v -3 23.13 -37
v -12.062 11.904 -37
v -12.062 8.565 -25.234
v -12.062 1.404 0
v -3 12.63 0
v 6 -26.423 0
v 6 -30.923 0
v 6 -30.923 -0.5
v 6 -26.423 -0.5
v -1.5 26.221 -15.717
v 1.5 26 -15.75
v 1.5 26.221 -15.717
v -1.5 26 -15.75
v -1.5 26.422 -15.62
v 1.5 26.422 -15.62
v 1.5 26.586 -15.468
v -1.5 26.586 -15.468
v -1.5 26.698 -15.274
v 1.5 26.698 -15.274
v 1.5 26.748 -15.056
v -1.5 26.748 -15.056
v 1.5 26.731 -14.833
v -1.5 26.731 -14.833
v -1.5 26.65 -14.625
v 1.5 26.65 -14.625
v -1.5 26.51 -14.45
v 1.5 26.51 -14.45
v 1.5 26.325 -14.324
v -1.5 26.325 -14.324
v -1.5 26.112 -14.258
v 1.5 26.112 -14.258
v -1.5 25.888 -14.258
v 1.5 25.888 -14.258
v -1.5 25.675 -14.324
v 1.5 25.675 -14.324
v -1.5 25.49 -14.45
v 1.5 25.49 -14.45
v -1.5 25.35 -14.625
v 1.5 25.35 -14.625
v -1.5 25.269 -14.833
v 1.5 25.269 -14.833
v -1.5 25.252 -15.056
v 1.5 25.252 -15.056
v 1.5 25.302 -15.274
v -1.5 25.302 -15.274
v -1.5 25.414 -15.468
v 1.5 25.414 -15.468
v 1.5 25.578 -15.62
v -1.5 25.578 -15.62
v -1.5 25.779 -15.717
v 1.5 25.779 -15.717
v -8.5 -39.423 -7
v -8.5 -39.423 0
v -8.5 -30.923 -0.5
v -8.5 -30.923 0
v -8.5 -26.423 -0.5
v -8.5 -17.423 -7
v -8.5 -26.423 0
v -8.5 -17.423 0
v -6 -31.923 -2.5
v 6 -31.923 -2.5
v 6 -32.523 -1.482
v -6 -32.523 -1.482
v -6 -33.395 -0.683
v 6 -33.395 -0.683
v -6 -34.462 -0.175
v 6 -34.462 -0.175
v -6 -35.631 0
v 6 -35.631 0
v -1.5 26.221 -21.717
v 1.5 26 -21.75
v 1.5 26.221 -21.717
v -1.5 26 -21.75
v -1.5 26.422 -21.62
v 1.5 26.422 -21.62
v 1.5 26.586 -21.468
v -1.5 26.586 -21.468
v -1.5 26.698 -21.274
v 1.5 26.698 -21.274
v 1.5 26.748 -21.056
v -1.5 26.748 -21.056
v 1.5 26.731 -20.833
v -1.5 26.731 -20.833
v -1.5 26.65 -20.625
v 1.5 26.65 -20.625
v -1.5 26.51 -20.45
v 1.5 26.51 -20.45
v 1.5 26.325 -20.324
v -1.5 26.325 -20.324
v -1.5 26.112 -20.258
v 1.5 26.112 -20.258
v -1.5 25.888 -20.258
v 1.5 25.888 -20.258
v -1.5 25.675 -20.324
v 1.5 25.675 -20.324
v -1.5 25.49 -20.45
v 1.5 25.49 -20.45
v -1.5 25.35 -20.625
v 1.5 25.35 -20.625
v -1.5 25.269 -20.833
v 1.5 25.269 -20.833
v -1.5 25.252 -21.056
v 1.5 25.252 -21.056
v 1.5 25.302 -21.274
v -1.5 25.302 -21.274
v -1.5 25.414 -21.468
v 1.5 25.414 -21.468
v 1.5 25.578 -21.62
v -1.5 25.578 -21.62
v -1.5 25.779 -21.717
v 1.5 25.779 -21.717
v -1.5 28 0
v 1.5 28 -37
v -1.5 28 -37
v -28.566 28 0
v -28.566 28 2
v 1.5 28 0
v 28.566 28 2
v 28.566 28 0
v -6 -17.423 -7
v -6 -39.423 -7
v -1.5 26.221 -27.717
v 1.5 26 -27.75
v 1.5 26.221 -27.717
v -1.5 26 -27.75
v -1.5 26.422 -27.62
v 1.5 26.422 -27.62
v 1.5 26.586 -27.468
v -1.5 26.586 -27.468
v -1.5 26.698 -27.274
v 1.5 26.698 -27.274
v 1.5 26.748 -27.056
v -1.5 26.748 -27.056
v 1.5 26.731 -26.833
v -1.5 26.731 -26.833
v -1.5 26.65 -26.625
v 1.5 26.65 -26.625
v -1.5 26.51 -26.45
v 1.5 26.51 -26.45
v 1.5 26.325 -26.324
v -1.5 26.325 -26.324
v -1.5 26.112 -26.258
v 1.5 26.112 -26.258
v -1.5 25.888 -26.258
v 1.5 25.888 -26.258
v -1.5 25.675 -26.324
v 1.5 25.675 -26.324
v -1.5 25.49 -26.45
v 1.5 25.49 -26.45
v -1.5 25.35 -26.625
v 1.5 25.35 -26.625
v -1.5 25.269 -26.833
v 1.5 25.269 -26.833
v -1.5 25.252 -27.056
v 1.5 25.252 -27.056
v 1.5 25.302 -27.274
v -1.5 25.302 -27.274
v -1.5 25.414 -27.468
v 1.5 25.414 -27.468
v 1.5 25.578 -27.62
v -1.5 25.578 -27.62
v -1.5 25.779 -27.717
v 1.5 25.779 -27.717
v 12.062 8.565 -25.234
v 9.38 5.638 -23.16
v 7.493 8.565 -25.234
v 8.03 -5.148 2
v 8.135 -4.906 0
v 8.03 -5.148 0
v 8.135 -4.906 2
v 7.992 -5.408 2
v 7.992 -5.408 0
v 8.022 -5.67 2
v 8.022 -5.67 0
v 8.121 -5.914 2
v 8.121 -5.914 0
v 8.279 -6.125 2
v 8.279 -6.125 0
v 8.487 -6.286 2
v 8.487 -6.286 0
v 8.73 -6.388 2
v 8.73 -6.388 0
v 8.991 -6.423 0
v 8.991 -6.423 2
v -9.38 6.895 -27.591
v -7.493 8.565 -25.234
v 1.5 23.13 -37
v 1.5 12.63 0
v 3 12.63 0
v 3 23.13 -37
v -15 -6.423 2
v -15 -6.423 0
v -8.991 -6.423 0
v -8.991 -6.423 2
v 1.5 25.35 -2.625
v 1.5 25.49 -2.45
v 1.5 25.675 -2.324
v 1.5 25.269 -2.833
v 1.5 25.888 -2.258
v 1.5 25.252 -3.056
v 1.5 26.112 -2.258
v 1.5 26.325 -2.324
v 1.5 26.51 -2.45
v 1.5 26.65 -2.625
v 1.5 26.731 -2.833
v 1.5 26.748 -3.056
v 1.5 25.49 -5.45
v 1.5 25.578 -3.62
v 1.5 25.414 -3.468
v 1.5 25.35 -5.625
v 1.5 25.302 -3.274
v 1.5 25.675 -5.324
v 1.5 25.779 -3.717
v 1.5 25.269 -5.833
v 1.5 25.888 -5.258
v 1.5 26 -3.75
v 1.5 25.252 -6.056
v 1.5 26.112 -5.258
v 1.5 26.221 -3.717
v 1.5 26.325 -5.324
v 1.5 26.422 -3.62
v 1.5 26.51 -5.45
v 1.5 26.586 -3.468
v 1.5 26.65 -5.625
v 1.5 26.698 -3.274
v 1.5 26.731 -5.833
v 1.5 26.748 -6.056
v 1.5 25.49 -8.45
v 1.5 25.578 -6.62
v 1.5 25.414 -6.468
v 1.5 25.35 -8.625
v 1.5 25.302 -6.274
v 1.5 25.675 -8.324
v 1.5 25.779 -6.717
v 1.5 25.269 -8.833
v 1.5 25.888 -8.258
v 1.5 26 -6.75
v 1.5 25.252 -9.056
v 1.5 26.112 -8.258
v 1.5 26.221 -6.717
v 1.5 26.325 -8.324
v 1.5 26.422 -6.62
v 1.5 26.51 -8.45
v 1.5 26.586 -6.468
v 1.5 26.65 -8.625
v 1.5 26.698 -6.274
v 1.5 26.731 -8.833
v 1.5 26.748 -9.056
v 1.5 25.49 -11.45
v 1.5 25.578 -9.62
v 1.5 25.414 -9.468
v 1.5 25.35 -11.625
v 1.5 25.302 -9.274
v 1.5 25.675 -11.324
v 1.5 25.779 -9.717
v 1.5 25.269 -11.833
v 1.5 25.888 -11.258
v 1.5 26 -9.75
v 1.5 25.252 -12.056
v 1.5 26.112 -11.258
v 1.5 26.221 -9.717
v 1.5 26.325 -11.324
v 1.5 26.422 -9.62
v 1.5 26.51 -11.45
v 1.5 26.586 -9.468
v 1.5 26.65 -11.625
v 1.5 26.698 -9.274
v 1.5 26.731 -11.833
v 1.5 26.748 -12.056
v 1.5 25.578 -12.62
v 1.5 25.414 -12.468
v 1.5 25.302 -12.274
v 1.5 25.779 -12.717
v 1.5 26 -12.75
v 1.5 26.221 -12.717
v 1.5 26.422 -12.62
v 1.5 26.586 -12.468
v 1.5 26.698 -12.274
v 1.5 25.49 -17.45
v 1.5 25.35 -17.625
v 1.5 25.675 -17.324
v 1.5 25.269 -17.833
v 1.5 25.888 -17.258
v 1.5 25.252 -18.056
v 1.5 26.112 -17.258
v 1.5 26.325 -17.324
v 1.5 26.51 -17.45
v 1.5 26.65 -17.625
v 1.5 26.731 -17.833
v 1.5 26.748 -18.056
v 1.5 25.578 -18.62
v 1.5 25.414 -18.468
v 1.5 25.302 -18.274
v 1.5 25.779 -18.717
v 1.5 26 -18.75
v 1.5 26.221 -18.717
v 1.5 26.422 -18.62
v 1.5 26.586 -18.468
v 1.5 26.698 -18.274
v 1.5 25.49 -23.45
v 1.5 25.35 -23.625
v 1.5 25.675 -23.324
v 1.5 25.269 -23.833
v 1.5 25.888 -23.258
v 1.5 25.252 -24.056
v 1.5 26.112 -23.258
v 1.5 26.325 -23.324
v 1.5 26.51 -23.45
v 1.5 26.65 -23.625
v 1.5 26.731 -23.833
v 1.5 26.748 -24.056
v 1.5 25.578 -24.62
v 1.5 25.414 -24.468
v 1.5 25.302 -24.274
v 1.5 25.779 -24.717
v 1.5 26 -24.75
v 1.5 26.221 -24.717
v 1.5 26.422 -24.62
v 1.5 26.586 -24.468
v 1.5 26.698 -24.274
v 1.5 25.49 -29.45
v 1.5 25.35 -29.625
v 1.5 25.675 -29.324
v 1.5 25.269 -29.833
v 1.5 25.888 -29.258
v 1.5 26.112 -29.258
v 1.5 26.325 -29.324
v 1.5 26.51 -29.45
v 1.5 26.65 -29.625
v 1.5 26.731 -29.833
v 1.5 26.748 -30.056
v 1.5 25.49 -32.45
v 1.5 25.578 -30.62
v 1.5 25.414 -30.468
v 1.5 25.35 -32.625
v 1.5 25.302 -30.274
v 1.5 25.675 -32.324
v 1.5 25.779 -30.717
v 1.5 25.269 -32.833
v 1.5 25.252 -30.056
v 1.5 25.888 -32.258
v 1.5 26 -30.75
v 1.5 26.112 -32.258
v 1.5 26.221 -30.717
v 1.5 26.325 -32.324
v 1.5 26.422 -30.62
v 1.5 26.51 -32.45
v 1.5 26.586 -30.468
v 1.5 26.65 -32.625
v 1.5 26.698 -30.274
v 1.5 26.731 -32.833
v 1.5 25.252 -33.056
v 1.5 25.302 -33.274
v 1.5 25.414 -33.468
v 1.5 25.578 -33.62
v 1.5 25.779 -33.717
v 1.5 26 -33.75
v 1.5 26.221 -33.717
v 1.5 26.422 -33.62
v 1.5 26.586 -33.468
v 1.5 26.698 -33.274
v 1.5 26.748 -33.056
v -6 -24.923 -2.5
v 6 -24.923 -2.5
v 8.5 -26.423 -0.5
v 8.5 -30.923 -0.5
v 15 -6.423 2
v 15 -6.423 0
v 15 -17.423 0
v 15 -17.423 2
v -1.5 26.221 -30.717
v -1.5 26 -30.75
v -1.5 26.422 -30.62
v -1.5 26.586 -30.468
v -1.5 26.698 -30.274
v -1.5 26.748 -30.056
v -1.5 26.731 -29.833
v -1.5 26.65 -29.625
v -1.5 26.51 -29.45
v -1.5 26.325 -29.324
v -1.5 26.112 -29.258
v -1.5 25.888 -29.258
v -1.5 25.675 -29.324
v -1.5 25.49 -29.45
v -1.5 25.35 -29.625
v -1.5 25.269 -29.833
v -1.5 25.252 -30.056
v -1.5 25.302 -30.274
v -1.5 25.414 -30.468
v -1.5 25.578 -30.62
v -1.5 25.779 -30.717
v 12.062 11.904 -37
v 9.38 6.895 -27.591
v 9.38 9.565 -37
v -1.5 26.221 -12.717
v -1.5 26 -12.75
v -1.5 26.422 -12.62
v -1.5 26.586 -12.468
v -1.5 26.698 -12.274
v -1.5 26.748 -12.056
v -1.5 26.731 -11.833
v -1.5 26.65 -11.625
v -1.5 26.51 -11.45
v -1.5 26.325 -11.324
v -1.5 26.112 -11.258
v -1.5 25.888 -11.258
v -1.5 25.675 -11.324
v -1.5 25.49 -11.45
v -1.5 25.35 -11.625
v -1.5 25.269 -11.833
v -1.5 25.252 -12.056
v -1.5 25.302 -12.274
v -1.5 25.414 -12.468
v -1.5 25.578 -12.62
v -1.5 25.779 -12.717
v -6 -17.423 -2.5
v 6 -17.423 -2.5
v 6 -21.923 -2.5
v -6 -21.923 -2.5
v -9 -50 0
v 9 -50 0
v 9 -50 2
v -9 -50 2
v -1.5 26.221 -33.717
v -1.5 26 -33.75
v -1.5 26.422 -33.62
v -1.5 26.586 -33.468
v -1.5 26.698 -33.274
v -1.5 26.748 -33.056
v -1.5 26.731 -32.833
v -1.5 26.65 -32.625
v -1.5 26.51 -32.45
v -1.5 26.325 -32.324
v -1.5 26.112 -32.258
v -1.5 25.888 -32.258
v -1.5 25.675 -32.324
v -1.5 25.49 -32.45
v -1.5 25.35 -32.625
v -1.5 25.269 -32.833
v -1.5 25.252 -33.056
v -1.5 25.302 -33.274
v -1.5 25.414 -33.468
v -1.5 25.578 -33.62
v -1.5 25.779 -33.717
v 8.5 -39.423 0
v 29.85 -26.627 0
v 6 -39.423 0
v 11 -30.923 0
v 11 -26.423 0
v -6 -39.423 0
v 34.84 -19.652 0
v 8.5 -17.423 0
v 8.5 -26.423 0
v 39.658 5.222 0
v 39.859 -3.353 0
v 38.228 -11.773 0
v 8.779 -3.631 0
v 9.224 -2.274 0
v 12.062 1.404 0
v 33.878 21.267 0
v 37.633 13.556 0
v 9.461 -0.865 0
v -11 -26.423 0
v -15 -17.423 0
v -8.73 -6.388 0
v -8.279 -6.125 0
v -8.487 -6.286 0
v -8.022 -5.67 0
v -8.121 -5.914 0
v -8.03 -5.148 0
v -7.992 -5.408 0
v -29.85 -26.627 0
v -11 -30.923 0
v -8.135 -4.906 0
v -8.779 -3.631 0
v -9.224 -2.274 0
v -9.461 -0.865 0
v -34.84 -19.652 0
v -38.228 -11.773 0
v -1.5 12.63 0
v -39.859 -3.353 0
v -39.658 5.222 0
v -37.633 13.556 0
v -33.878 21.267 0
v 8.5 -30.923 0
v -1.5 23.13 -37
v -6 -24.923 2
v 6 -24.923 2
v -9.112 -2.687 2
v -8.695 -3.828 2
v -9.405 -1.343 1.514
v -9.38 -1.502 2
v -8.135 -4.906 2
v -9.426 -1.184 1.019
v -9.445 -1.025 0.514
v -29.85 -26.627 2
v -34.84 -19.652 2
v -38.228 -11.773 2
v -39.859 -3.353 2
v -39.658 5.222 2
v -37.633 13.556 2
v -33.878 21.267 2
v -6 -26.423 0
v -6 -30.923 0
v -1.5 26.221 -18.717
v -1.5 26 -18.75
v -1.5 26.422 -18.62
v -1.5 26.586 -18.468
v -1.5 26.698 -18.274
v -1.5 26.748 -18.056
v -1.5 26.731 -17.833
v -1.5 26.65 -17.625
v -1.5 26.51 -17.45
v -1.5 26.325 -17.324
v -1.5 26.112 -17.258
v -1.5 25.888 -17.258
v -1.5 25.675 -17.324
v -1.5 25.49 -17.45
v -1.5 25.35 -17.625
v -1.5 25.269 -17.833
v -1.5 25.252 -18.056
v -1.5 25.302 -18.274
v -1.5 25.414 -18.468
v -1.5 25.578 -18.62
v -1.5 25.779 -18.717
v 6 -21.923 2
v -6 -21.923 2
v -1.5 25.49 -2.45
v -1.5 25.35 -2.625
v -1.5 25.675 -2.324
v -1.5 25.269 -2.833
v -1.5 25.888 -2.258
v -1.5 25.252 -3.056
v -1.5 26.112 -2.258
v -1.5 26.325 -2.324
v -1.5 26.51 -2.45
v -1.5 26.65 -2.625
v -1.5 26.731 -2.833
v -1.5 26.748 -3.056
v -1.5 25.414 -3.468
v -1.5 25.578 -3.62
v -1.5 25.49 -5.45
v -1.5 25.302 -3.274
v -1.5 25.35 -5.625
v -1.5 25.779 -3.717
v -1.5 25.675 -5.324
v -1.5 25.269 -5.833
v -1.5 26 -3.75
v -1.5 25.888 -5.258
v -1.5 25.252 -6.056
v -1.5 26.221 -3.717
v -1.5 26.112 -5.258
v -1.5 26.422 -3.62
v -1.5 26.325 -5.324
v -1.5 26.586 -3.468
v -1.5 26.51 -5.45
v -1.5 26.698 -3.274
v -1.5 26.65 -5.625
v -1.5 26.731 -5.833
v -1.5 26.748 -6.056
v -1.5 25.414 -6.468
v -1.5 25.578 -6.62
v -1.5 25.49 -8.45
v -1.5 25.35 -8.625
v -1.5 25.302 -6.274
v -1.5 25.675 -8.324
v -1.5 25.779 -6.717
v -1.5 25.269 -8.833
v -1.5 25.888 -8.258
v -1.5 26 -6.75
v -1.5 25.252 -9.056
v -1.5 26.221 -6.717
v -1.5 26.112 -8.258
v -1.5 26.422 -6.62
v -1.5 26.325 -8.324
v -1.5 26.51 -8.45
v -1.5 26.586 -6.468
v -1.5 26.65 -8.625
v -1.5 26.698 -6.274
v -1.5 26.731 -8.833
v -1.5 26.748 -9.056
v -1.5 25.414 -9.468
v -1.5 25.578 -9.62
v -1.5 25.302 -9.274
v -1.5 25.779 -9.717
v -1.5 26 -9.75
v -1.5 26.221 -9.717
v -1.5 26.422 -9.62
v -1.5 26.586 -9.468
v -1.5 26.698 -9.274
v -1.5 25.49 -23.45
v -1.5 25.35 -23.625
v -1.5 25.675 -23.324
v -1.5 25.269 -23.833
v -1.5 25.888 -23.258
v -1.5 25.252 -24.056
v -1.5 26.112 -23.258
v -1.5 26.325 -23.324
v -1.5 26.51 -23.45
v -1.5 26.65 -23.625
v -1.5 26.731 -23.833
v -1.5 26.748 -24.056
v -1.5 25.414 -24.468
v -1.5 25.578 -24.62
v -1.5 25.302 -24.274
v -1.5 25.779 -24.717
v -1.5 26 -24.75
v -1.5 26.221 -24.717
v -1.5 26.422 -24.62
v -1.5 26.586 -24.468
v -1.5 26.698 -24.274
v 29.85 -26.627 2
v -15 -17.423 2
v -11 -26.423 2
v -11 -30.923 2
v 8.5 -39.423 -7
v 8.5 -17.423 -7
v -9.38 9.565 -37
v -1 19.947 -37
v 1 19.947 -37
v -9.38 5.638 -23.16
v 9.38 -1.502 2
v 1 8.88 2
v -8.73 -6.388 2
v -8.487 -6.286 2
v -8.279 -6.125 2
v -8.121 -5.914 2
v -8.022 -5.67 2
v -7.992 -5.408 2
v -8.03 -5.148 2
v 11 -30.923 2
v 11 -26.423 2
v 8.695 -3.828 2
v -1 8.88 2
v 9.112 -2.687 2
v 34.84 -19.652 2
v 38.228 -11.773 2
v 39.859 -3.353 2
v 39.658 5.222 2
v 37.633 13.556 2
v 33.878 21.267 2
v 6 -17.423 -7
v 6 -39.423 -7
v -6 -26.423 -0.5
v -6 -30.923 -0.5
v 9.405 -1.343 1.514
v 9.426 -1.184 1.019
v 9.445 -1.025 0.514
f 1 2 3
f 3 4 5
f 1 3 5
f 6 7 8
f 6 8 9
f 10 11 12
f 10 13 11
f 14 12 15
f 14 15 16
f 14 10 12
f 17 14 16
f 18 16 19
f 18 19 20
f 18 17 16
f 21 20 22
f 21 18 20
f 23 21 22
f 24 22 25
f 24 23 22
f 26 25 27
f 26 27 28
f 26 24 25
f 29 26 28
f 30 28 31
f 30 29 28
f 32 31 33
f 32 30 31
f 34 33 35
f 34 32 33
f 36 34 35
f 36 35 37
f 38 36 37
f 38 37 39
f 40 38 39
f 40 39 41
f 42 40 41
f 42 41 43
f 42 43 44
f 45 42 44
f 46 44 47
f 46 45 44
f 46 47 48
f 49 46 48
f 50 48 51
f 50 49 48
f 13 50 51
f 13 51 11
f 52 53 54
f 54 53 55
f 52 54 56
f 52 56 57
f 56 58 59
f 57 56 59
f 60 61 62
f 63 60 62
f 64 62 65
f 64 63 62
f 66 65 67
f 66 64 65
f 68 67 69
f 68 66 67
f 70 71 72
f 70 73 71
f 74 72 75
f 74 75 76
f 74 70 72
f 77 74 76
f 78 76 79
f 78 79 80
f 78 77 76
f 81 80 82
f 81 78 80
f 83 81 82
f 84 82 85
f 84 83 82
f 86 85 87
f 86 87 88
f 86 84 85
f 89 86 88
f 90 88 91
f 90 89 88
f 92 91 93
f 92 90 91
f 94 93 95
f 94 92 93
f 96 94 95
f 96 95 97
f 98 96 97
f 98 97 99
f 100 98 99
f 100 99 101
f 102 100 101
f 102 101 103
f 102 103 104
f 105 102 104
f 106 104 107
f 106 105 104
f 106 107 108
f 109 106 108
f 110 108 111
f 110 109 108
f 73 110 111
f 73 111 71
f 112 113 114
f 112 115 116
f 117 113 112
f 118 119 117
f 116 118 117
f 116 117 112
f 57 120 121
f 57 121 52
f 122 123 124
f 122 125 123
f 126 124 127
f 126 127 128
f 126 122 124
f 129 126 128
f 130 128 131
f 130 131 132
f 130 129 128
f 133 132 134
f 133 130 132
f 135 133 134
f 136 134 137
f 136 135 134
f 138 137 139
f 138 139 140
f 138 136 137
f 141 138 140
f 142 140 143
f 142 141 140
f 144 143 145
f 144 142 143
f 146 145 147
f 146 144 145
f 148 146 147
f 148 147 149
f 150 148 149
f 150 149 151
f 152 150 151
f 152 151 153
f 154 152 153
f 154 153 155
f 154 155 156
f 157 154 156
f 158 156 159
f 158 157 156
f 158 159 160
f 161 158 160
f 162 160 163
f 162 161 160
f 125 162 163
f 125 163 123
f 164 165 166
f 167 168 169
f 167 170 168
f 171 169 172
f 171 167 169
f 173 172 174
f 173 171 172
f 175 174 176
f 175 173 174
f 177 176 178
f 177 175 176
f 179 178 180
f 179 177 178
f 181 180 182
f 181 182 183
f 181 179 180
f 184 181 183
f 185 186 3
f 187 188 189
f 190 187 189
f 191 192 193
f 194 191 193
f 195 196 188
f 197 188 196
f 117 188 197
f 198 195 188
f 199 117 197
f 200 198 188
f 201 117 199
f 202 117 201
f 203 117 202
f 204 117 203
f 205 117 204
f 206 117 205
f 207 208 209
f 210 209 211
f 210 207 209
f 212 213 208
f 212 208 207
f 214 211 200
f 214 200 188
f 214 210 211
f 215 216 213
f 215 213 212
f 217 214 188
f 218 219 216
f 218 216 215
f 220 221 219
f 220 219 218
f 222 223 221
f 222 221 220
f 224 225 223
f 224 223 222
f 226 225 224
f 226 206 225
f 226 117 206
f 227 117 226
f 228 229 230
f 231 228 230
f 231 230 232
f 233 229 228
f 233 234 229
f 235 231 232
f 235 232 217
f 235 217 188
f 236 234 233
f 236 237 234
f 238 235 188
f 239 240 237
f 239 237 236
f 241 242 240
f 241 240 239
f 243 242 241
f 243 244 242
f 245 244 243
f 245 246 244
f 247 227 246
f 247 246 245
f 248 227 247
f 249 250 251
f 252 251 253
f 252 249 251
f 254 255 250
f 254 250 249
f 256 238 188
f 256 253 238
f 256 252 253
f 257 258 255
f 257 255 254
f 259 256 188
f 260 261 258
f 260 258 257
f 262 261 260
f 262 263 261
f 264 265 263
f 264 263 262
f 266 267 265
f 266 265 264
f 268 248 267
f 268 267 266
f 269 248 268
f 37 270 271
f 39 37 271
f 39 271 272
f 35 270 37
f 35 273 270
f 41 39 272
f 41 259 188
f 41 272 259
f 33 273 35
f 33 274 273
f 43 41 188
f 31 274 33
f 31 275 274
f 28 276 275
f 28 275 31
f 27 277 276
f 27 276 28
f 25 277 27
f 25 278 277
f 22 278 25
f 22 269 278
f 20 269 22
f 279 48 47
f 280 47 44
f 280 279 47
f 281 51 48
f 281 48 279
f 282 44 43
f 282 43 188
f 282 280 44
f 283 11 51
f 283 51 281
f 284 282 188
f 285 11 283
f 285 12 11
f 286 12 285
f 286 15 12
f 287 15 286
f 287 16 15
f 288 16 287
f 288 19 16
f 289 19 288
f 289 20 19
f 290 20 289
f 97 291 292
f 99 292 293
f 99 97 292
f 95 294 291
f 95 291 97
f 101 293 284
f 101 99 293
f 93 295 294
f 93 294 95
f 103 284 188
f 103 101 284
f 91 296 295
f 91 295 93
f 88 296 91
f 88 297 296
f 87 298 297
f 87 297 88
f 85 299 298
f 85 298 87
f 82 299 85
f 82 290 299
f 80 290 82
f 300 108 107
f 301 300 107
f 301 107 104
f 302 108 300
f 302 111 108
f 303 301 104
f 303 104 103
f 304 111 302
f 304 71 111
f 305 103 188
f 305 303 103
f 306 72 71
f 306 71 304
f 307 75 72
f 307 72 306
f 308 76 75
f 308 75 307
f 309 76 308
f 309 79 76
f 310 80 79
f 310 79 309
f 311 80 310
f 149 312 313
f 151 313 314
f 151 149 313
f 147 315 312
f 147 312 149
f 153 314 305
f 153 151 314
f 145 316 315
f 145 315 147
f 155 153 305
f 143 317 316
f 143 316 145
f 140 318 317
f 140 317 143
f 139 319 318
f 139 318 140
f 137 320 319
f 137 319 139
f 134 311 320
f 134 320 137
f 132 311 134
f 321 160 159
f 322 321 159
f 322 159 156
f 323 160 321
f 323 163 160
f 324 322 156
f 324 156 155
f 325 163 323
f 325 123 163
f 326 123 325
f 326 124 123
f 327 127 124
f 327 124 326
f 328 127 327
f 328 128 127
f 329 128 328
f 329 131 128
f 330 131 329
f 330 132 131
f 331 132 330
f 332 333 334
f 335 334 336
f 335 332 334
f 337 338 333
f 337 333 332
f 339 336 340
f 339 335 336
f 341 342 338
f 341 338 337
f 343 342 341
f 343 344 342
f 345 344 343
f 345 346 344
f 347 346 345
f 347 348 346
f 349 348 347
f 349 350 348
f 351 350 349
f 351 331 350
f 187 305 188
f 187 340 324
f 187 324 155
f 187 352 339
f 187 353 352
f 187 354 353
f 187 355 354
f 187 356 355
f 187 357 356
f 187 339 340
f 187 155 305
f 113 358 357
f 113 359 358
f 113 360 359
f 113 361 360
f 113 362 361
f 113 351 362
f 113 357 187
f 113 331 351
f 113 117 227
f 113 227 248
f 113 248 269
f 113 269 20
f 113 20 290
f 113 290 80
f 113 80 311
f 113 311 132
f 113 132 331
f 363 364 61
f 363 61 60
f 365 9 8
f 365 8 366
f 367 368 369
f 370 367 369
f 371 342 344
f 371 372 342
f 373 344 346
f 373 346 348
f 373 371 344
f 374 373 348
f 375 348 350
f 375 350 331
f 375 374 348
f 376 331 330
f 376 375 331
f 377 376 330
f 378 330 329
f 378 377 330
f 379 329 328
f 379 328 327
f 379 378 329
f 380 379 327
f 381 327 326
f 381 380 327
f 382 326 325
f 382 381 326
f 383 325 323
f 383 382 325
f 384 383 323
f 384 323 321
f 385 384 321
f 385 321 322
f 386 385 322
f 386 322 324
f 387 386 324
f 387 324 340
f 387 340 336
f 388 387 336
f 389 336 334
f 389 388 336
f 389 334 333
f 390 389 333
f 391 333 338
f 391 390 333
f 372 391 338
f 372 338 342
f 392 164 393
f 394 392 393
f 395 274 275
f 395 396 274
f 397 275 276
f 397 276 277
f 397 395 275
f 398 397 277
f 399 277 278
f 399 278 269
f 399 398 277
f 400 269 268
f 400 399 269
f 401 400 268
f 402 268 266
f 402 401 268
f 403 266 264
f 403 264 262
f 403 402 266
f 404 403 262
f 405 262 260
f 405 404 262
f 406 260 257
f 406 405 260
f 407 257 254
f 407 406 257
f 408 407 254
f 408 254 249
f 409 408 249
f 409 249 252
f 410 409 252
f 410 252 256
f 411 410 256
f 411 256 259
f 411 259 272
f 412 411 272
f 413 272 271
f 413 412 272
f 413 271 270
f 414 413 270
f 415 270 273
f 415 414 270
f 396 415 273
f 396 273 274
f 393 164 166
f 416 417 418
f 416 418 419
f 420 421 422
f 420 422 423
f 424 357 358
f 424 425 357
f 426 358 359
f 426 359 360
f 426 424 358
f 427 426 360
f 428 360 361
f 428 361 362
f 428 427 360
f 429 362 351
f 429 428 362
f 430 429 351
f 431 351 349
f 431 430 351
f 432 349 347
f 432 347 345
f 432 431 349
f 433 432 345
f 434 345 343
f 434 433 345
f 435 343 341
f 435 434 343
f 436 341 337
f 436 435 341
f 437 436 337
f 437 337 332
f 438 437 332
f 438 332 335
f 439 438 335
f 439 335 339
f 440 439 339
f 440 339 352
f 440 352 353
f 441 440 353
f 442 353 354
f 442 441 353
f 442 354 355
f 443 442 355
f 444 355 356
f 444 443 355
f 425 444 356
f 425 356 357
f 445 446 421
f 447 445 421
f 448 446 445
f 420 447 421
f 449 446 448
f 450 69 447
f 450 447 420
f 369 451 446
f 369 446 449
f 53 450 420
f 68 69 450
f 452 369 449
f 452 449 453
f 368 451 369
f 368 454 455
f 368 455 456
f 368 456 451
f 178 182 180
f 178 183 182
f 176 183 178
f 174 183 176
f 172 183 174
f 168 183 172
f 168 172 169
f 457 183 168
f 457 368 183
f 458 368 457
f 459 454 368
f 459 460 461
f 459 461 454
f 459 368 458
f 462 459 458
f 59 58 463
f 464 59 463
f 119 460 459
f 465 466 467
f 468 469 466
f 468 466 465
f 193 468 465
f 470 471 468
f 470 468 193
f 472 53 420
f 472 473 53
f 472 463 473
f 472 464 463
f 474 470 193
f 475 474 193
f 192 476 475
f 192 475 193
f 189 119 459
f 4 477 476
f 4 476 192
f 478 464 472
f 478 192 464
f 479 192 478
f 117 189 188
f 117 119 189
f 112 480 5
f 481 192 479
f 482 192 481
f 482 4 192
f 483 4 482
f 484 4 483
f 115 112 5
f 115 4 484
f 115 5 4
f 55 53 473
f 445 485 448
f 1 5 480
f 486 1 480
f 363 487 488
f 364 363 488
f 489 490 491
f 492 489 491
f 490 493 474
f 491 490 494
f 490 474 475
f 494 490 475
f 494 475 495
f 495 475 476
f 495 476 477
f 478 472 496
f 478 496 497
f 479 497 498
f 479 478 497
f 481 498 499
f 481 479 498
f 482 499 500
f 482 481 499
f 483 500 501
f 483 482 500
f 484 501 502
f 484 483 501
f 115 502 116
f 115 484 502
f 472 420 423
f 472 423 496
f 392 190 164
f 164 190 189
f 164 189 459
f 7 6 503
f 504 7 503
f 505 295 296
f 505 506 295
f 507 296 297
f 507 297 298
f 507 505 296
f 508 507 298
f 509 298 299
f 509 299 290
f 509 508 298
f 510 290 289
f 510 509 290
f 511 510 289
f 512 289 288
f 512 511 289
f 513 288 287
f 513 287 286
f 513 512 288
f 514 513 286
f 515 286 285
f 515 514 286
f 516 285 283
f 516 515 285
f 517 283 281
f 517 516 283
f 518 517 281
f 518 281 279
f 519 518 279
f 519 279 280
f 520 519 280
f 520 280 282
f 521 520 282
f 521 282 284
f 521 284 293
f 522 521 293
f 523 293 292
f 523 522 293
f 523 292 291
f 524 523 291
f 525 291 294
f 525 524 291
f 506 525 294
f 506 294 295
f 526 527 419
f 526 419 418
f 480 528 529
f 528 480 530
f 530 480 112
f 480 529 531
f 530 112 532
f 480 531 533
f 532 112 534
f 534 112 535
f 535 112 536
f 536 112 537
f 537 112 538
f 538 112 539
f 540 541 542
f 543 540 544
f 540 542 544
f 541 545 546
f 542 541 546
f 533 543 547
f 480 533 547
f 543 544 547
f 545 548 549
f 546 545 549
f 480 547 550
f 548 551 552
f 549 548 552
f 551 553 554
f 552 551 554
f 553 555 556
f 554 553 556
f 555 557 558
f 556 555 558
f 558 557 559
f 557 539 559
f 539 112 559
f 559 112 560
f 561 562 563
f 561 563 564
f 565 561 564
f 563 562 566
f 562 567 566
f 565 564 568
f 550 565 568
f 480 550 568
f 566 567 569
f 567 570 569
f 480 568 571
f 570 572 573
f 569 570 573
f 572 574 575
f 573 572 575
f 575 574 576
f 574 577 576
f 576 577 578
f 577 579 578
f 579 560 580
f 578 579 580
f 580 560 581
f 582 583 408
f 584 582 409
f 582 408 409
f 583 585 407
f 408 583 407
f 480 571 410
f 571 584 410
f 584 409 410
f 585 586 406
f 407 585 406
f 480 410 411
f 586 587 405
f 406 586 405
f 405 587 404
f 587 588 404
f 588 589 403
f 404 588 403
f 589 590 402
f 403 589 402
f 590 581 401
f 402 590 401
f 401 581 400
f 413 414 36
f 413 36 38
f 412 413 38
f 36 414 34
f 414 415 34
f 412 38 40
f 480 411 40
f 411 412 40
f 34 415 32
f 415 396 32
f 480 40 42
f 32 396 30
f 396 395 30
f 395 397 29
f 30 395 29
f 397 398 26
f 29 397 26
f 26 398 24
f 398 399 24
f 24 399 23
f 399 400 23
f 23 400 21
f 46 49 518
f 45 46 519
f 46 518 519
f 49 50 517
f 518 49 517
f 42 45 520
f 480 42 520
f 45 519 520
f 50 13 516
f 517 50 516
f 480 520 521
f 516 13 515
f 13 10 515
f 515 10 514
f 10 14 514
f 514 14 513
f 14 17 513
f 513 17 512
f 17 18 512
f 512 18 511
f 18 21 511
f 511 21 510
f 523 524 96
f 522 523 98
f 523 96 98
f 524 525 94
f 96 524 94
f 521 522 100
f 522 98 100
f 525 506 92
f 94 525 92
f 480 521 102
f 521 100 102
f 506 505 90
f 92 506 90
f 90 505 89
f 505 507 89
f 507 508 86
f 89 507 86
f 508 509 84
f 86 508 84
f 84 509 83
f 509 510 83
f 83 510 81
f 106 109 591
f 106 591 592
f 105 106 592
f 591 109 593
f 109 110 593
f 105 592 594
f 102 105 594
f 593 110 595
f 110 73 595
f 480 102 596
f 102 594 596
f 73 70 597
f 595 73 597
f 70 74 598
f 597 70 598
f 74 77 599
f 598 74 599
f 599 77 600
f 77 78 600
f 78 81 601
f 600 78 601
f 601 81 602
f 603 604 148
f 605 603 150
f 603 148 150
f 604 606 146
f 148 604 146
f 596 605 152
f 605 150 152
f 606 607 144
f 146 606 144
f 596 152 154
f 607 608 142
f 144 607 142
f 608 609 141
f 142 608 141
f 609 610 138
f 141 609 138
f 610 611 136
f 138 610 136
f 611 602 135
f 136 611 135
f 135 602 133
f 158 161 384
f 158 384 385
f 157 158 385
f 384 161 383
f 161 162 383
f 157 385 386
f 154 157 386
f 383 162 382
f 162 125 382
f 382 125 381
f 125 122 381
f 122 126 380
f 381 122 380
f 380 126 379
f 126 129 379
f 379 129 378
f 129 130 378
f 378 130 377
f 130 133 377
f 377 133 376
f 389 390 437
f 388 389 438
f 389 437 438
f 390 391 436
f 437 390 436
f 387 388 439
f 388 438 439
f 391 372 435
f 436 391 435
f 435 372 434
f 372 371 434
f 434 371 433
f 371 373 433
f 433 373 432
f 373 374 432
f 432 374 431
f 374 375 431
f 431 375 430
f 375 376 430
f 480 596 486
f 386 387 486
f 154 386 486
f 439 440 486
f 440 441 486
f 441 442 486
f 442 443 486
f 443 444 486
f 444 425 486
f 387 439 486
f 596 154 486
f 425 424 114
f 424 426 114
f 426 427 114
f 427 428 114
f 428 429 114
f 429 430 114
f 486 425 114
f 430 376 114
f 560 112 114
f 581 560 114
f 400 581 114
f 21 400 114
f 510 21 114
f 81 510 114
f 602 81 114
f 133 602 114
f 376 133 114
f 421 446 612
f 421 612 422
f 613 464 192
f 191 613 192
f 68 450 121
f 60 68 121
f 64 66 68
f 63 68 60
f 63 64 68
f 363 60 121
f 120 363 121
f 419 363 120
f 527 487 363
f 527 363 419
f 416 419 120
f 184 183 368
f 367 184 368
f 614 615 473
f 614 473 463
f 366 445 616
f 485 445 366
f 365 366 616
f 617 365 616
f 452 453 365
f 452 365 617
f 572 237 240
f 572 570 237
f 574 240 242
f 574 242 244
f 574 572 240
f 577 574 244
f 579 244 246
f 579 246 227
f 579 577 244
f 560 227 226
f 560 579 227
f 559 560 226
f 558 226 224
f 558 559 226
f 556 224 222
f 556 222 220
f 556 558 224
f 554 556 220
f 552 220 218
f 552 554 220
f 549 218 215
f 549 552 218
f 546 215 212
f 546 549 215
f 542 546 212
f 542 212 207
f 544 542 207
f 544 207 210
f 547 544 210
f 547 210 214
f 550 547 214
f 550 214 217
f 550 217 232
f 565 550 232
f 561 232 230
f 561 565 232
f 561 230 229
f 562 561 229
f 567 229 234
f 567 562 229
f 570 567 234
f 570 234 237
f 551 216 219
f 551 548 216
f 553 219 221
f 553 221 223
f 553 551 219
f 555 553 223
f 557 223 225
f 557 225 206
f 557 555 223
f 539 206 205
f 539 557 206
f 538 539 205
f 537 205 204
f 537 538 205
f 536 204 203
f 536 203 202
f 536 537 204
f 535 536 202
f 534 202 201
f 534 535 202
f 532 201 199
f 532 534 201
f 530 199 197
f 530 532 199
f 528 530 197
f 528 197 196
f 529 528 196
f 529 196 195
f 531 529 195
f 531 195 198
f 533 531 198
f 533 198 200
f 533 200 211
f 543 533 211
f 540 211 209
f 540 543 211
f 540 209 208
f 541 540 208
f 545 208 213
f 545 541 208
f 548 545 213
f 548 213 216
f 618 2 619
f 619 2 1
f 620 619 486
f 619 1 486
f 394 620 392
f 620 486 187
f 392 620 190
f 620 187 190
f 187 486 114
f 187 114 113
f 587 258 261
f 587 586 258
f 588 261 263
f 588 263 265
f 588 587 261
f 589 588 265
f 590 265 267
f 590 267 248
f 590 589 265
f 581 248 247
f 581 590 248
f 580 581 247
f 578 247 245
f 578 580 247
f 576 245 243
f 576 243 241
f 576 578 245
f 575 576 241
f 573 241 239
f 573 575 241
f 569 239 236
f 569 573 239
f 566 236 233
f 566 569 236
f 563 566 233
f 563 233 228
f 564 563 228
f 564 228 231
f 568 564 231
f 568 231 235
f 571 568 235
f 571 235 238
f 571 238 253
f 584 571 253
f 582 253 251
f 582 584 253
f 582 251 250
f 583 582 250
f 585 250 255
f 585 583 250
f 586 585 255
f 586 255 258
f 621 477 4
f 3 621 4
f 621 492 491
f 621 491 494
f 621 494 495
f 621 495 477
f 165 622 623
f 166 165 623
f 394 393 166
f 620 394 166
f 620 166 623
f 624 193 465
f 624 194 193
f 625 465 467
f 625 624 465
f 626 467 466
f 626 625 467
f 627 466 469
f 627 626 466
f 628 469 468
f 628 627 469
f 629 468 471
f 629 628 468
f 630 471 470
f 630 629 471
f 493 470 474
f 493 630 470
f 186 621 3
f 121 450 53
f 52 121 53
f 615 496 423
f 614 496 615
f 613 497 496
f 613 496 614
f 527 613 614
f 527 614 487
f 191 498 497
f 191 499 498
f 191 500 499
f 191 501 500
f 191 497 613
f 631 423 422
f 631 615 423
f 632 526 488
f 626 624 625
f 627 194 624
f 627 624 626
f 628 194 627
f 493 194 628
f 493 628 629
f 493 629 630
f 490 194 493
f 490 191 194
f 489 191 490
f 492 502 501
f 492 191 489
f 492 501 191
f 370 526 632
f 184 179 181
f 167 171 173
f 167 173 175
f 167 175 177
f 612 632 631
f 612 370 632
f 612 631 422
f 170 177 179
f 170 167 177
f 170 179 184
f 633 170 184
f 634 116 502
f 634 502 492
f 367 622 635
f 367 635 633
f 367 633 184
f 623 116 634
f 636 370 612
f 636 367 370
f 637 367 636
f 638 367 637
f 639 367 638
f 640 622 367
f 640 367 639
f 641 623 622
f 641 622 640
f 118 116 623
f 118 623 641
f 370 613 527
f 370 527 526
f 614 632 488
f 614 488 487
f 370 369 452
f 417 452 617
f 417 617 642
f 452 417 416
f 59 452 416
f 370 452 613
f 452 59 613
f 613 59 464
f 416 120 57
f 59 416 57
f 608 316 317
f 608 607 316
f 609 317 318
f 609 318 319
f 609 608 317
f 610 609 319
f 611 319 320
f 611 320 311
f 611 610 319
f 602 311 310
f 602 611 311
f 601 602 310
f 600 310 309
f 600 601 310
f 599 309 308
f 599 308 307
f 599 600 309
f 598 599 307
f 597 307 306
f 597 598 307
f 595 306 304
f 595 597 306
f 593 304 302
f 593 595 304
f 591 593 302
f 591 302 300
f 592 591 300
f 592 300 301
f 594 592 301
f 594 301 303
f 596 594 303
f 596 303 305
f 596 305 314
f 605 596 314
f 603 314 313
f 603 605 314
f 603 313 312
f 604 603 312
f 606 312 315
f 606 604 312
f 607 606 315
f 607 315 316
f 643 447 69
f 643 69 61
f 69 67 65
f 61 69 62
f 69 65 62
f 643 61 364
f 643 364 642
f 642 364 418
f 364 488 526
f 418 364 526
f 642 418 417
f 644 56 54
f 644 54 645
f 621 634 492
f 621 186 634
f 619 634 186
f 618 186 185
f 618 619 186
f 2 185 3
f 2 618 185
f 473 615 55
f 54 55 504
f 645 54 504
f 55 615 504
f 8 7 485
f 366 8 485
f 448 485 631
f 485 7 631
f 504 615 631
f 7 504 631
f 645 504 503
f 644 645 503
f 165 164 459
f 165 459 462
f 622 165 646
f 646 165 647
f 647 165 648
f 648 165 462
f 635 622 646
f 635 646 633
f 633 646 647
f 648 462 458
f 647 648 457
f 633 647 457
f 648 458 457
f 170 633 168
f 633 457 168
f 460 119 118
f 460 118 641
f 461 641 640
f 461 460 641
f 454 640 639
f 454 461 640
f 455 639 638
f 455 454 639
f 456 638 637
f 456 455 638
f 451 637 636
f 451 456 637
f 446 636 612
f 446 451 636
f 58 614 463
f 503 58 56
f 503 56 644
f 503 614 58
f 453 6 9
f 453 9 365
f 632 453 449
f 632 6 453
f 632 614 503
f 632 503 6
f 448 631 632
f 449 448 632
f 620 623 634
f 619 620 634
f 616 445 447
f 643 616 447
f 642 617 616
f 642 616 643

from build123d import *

# Parameters (mm, degrees)
BOSS_EXTRUDE1_DEPTH             = 2
SKETCH2_R                       = 0.75
BOSS_EXTRUDE2_DEPTH             = 1.5
BOSS_EXTRUDE3_REACH             = 75.225
BOSS_EXTRUDE3_DIRECTION_2_REACH = 75.225
CUT_EXTRUDE1_DEPTH              = 16.5
SKETCH5_W                       = 2.5
SKETCH5_H                       = 22
BOSS_EXTRUDE4_DEPTH             = 7
SKETCH6_W                       = 12
SKETCH6_H                       = 3
SKETCH6_W_2                     = 22
SKETCH6_H_2                     = 4.5
CUT_EXTRUDE2_DEPTH              = 2.5
SKETCH7_W                       = 12
SKETCH7_H                       = 7
SKETCH7_H_2                     = 4.5
BOSS_EXTRUDE5_DEPTH             = 2.5
FILLET1_R                       = 4
FILLET2_R                       = 1


with BuildPart() as part:
    # Sketch1 → Boss-Extrude1 (new body)
    with BuildSketch(Plane.XY):
        with BuildLine():
            Line((-28.565713714, 28), (28.565713714, 28))
            ThreePointArc((28.565713714, 28), (39.988956848, 0.93985647), (29.849608312, -26.627070504))
            Line((29.849608312, -26.627070504), (9, -50))
            Line((9, -50), (-9, -50))
            Line((-9, -50), (-29.849608312, -26.627070504))
            ThreePointArc((-29.849608312, -26.627070504), (-39.988956848, 0.93985647), (-28.565713714, 28))
        make_face()
        with BuildLine():
            Line((7, -6.422616289), (15, -6.422616289))
            Line((15, -6.422616289), (15, -17.422616289))
            Line((15, -17.422616289), (-15, -17.422616289))
            Line((-15, -17.422616289), (-15, -6.422616289))
            Line((-15, -6.422616289), (-7, -6.422616289))
            ThreePointArc((-7, -6.422616289), (0, 9.5), (7, -6.422616289))
        make_face(mode=Mode.SUBTRACT)
    extrude(amount=BOSS_EXTRUDE1_DEPTH)

    # Sketch2 → Boss-Extrude2 (add, symmetric)
    with BuildSketch(Plane(origin=(0, 0, 0), x_dir=(0, 0, -1), z_dir=(1, 0, 0))):
        Polygon((0, 9.5), (37, 20), (37, 28), (0, 28), align=None)
        with Locations((3, 26)):
            Circle(SKETCH2_R, mode=Mode.SUBTRACT)
        with Locations((6, 26)):
            Circle(SKETCH2_R, mode=Mode.SUBTRACT)
        with Locations((9, 26)):
            Circle(SKETCH2_R, mode=Mode.SUBTRACT)
        with Locations((12, 26)):
            Circle(SKETCH2_R, mode=Mode.SUBTRACT)
        with Locations((15, 26)):
            Circle(SKETCH2_R, mode=Mode.SUBTRACT)
        with Locations((18, 26)):
            Circle(SKETCH2_R, mode=Mode.SUBTRACT)
        with Locations((21, 26)):
            Circle(SKETCH2_R, mode=Mode.SUBTRACT)
        with Locations((24, 26)):
            Circle(SKETCH2_R, mode=Mode.SUBTRACT)
        with Locations((27, 26)):
            Circle(SKETCH2_R, mode=Mode.SUBTRACT)
        with Locations((30, 26)):
            Circle(SKETCH2_R, mode=Mode.SUBTRACT)
        with Locations((33, 26)):
            Circle(SKETCH2_R, mode=Mode.SUBTRACT)
    extrude(amount=BOSS_EXTRUDE2_DEPTH, both=True)

    # Boss-Extrude3: up to this plane
    boss_extrude3_end = Plane(origin=(1.5, 20, -37), z_dir=(0, 0, 1))
    # Sketch3 → Boss-Extrude3 (add, up to the surface)
    with BuildSketch(Plane(origin=(0, 0.708044617, -2.495014365), x_dir=(1, 0, 0), z_dir=(0, -0.27300368557463345, 0.9620129872629926)), mode=Mode.PRIVATE) as boss_extrude3_sk1:
        Polygon((1, 9.088350078), (-1, 9.088350078), (-9.380481154, -0.899118445), (-12.061636705, 1.350638189), (-3, 12.149876287), (3, 12.149876287), (12.061636705, 1.350638189), (9.380481154, -0.899118445), align=None)
    boss_extrude3_tool1 = split(extrude(boss_extrude3_sk1.sketch, amount=-BOSS_EXTRUDE3_REACH, mode=Mode.PRIVATE), bisect_by=boss_extrude3_end, keep=Keep.BOTH, mode=Mode.PRIVATE)
    add(boss_extrude3_tool1.solids().sort_by_distance((0, 9.715001, 0.061014))[0])

    # Boss-Extrude3 direction 2: up to this plane
    boss_extrude3_direction_2_end = Plane(origin=(0, 0, 2), z_dir=(0, 0, 1))
    # Sketch3 → Boss-Extrude3 direction 2 (add, up to the surface)
    with BuildSketch(Plane(origin=(0, 0.708044617, -2.495014365), x_dir=(1, 0, 0), z_dir=(0, -0.27300368557463345, 0.9620129872629926)), mode=Mode.PRIVATE) as boss_extrude3_direction_2_sk1:
        Polygon((1, 9.088350078), (-1, 9.088350078), (-9.380481154, -0.899118445), (-12.061636705, 1.350638189), (-3, 12.149876287), (3, 12.149876287), (12.061636705, 1.350638189), (9.380481154, -0.899118445), align=None)
    boss_extrude3_direction_2_tool1 = split(extrude(boss_extrude3_direction_2_sk1.sketch, amount=BOSS_EXTRUDE3_DIRECTION_2_REACH, mode=Mode.PRIVATE), bisect_by=boss_extrude3_direction_2_end, keep=Keep.BOTH, mode=Mode.PRIVATE)
    add(boss_extrude3_direction_2_tool1.solids().sort_by_distance((0, 9.715001, 0.061014))[0])

    # Sketch4 → Cut-Extrude1 (cut, symmetric)
    with BuildSketch(Plane(origin=(0, 0, 0), x_dir=(0, 0, -1), z_dir=(1, 0, 0))):
        Polygon((20.376494071, 1.70865423), (25.234329822, 8.565064446), (31.144411196, 4.377712218), align=None)
    extrude(amount=CUT_EXTRUDE1_DEPTH, both=True, mode=Mode.SUBTRACT)

    # Sketch5 → Boss-Extrude4 (add)
    with BuildSketch(Plane(origin=(0, 0, 0), x_dir=(-1, 0, 0), z_dir=(0, 0, -1))):
        with Locations((-7.25, -28.422616289)):
            Rectangle(SKETCH5_W, SKETCH5_H)
        with Locations((7.25, -28.422616289)):
            Rectangle(SKETCH5_W, SKETCH5_H)
    extrude(amount=BOSS_EXTRUDE4_DEPTH)

    # Sketch6 → Cut-Extrude2 (cut)
    with BuildSketch(Plane.XY.offset(2)):
        with Locations((0, -23.422616289)):
            Rectangle(SKETCH6_W, SKETCH6_H)
        with Locations((0, -28.672616289)):
            Rectangle(SKETCH6_W_2, SKETCH6_H_2)
    extrude(amount=-CUT_EXTRUDE2_DEPTH, mode=Mode.SUBTRACT)

    # Sketch7 → Boss-Extrude5 (add)
    with BuildSketch(Plane(origin=(0, 0, 0), x_dir=(-1, 0, 0), z_dir=(0, 0, -1))):
        with Locations((0, -28.422616289)):
            Rectangle(SKETCH7_W, SKETCH7_H)
        with Locations((0, -19.672616289)):
            Rectangle(SKETCH7_W, SKETCH7_H_2)
    extrude(amount=BOSS_EXTRUDE5_DEPTH)

    # Fillet1
    # the kernel refuses this fillet: 4 mm, written as the material it adds along each edge
    with BuildSketch(Plane(origin=(-6, -31.922616289, 0), x_dir=(0, 0, -1), z_dir=(1, 0, 0))) as fillet1_piece_1:
        with BuildLine():
            CenterArc((4, -3.708099244), FILLET1_R, 112.024312837, 67.975687163)
            Line((0, -3.708099244), (-0.08, -3.708099244))
            Line((-0.08, -3.708099244), (-0.08, 0))
            Line((-0.08, 0), (0, 0.08))
            ThreePointArc((0, 0.08), (1.25, 0.08), (2.47, 0.074161985))
            Line((2.47, 0.074161985), (2.5, 0))
        make_face()
    extrude(amount=12)

    # Fillet2
    fillet2_edges = [part.edges().sort_by_distance(p)[0] for p in [
        (7, -6.422616289, 1),
        (-7, -6.422616289, 1),
    ]]
    fillet(fillet2_edges, radius=FILLET2_R)


solid = part.part
